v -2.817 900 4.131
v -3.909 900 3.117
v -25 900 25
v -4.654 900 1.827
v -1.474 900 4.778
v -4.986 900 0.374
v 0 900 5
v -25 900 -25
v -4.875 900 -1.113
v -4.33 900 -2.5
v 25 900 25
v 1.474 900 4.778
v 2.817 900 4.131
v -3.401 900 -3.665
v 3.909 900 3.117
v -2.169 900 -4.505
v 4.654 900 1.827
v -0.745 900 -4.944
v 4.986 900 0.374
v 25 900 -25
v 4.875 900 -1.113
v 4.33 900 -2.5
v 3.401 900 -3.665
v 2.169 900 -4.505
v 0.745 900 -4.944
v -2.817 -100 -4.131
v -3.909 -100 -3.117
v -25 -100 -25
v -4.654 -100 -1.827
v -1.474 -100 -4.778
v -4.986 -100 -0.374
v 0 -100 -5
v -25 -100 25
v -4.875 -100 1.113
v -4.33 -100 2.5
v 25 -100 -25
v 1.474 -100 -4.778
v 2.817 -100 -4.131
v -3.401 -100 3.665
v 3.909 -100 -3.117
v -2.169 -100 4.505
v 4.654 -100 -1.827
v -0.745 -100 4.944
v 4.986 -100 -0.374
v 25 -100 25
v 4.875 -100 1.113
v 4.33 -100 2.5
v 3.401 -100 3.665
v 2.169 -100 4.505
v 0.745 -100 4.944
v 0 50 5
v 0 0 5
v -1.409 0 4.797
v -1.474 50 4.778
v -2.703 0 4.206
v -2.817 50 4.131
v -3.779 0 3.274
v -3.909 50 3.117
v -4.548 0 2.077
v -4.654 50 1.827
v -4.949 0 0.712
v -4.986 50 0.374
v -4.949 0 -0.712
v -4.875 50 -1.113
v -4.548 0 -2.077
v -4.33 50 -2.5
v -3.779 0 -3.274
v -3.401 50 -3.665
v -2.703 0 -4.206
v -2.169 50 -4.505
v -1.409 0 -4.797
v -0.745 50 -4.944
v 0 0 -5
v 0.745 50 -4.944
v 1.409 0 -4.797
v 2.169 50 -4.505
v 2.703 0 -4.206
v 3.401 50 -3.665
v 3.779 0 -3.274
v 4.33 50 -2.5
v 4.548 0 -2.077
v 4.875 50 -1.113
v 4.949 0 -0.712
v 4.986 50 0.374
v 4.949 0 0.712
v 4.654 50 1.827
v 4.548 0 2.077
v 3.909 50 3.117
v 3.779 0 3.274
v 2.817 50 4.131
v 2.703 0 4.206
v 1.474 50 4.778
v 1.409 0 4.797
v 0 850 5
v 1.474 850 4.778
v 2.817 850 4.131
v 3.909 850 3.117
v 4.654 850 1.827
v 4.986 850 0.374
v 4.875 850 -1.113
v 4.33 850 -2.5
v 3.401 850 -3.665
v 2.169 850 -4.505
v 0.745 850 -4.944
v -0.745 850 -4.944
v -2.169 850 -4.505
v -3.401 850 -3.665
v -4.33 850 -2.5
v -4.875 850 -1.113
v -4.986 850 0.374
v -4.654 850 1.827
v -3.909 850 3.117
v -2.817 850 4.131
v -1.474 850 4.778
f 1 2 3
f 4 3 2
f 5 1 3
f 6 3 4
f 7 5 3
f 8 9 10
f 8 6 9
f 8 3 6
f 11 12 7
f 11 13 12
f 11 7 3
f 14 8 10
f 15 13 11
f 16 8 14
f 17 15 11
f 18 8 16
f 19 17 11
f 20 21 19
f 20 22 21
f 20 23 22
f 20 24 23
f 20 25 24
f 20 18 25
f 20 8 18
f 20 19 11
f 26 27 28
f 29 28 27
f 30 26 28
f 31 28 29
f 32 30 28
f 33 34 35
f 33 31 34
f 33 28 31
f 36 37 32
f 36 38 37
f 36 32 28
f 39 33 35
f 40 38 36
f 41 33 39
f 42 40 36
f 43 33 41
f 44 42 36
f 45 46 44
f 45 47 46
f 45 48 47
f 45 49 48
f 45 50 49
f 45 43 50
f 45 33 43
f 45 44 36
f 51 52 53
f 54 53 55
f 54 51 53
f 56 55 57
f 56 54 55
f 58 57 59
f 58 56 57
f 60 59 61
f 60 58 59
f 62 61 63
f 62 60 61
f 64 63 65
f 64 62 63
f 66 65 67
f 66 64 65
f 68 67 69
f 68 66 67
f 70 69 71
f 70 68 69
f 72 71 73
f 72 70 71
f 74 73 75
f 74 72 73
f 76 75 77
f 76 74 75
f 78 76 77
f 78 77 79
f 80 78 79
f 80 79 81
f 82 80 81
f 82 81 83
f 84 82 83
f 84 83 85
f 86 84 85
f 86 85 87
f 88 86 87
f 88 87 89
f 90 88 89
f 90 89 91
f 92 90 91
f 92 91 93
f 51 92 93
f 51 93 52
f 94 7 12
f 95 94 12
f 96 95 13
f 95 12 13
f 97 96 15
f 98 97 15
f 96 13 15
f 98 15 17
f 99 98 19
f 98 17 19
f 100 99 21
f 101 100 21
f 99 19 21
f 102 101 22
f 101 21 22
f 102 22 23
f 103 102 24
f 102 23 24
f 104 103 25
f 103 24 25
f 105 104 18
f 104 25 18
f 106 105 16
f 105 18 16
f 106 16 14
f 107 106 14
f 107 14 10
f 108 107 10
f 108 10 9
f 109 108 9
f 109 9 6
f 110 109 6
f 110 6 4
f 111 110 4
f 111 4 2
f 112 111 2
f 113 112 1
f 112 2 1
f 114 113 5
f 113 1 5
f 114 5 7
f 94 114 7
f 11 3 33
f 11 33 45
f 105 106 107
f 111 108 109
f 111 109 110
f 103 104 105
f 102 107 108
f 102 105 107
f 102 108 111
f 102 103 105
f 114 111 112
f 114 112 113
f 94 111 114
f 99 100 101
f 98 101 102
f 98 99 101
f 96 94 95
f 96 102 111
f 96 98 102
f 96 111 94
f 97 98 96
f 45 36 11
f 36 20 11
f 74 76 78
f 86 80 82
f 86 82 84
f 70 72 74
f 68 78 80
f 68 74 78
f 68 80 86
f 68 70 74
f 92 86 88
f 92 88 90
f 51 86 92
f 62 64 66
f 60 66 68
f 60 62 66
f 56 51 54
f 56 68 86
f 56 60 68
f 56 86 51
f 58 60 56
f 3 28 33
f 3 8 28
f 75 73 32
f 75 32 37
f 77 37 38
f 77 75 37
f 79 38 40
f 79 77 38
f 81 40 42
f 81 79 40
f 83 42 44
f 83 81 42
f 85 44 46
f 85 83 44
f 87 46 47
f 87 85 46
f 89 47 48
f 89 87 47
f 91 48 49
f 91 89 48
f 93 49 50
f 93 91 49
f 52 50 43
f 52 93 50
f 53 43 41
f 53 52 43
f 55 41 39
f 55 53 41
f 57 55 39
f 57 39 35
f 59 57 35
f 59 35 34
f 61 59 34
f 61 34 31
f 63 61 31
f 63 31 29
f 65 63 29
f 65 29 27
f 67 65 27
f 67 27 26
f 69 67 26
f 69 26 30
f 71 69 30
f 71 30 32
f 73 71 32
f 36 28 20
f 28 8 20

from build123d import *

# Parameters (mm, degrees)
SKETCH_1_W          = 50
SKETCH_1_H          = 50
EXTRUDE_2_DEPTH     = 900
SKETCH_4_R          = 5
CUT_EXTRUDE_2_DEPTH = 50
CUT_EXTRUDE_START   = -50
SKETCH_5_R          = 5
CUT_EXTRUDE_3_DEPTH = 50
SKETCH_6_W          = 50
SKETCH_6_H          = 50
EXTRUDE_3_DEPTH     = 100
CUT_EXTRUDE_START_2 = -100
SKETCH_7_R          = 5
CUT_EXTRUDE_4_DEPTH = 100


with BuildPart() as part:
    # Эскиз1 → Бобышка-Вытянуть2 (new body)
    with BuildSketch(Plane(origin=(0, 0, 0), x_dir=(1, 0, 0), z_dir=(0, 1, 0))):
        Rectangle(SKETCH_1_W, SKETCH_1_H)
    extrude(amount=EXTRUDE_2_DEPTH)

    # Эскиз4 → Вырез-Вытянуть2 (cut)
    with BuildSketch(Plane(origin=(0, 900, 0), x_dir=(1, 0, 0), z_dir=(0, 1, 0))):
        with Locations(Location((0, 0, 0), (0, 0, 270))):
            Circle(SKETCH_4_R)
    extrude(amount=-CUT_EXTRUDE_2_DEPTH, mode=Mode.SUBTRACT)

    # Эскиз5 → Вырез-Вытянуть3 (cut)
    with BuildSketch(Plane.XZ.offset(CUT_EXTRUDE_START)):
        with Locations(Location((0, 0, 0), (0, 0, 90))):
            Circle(SKETCH_5_R)
    extrude(amount=CUT_EXTRUDE_3_DEPTH, mode=Mode.SUBTRACT)

    # Эскиз6 → Бобышка-Вытянуть3 (add)
    with BuildSketch(Plane.XZ):
        Rectangle(SKETCH_6_W, SKETCH_6_H)
    extrude(amount=EXTRUDE_3_DEPTH)

    # Эскиз7 → Вырез-Вытянуть4 (cut)
    with BuildSketch(Plane.XZ.offset(100).offset(CUT_EXTRUDE_START_2)):
        with Locations(Location((0, 0, 0), (0, 0, 270))):
            Circle(SKETCH_7_R)
    extrude(amount=CUT_EXTRUDE_4_DEPTH, mode=Mode.SUBTRACT)


solid = part.part
